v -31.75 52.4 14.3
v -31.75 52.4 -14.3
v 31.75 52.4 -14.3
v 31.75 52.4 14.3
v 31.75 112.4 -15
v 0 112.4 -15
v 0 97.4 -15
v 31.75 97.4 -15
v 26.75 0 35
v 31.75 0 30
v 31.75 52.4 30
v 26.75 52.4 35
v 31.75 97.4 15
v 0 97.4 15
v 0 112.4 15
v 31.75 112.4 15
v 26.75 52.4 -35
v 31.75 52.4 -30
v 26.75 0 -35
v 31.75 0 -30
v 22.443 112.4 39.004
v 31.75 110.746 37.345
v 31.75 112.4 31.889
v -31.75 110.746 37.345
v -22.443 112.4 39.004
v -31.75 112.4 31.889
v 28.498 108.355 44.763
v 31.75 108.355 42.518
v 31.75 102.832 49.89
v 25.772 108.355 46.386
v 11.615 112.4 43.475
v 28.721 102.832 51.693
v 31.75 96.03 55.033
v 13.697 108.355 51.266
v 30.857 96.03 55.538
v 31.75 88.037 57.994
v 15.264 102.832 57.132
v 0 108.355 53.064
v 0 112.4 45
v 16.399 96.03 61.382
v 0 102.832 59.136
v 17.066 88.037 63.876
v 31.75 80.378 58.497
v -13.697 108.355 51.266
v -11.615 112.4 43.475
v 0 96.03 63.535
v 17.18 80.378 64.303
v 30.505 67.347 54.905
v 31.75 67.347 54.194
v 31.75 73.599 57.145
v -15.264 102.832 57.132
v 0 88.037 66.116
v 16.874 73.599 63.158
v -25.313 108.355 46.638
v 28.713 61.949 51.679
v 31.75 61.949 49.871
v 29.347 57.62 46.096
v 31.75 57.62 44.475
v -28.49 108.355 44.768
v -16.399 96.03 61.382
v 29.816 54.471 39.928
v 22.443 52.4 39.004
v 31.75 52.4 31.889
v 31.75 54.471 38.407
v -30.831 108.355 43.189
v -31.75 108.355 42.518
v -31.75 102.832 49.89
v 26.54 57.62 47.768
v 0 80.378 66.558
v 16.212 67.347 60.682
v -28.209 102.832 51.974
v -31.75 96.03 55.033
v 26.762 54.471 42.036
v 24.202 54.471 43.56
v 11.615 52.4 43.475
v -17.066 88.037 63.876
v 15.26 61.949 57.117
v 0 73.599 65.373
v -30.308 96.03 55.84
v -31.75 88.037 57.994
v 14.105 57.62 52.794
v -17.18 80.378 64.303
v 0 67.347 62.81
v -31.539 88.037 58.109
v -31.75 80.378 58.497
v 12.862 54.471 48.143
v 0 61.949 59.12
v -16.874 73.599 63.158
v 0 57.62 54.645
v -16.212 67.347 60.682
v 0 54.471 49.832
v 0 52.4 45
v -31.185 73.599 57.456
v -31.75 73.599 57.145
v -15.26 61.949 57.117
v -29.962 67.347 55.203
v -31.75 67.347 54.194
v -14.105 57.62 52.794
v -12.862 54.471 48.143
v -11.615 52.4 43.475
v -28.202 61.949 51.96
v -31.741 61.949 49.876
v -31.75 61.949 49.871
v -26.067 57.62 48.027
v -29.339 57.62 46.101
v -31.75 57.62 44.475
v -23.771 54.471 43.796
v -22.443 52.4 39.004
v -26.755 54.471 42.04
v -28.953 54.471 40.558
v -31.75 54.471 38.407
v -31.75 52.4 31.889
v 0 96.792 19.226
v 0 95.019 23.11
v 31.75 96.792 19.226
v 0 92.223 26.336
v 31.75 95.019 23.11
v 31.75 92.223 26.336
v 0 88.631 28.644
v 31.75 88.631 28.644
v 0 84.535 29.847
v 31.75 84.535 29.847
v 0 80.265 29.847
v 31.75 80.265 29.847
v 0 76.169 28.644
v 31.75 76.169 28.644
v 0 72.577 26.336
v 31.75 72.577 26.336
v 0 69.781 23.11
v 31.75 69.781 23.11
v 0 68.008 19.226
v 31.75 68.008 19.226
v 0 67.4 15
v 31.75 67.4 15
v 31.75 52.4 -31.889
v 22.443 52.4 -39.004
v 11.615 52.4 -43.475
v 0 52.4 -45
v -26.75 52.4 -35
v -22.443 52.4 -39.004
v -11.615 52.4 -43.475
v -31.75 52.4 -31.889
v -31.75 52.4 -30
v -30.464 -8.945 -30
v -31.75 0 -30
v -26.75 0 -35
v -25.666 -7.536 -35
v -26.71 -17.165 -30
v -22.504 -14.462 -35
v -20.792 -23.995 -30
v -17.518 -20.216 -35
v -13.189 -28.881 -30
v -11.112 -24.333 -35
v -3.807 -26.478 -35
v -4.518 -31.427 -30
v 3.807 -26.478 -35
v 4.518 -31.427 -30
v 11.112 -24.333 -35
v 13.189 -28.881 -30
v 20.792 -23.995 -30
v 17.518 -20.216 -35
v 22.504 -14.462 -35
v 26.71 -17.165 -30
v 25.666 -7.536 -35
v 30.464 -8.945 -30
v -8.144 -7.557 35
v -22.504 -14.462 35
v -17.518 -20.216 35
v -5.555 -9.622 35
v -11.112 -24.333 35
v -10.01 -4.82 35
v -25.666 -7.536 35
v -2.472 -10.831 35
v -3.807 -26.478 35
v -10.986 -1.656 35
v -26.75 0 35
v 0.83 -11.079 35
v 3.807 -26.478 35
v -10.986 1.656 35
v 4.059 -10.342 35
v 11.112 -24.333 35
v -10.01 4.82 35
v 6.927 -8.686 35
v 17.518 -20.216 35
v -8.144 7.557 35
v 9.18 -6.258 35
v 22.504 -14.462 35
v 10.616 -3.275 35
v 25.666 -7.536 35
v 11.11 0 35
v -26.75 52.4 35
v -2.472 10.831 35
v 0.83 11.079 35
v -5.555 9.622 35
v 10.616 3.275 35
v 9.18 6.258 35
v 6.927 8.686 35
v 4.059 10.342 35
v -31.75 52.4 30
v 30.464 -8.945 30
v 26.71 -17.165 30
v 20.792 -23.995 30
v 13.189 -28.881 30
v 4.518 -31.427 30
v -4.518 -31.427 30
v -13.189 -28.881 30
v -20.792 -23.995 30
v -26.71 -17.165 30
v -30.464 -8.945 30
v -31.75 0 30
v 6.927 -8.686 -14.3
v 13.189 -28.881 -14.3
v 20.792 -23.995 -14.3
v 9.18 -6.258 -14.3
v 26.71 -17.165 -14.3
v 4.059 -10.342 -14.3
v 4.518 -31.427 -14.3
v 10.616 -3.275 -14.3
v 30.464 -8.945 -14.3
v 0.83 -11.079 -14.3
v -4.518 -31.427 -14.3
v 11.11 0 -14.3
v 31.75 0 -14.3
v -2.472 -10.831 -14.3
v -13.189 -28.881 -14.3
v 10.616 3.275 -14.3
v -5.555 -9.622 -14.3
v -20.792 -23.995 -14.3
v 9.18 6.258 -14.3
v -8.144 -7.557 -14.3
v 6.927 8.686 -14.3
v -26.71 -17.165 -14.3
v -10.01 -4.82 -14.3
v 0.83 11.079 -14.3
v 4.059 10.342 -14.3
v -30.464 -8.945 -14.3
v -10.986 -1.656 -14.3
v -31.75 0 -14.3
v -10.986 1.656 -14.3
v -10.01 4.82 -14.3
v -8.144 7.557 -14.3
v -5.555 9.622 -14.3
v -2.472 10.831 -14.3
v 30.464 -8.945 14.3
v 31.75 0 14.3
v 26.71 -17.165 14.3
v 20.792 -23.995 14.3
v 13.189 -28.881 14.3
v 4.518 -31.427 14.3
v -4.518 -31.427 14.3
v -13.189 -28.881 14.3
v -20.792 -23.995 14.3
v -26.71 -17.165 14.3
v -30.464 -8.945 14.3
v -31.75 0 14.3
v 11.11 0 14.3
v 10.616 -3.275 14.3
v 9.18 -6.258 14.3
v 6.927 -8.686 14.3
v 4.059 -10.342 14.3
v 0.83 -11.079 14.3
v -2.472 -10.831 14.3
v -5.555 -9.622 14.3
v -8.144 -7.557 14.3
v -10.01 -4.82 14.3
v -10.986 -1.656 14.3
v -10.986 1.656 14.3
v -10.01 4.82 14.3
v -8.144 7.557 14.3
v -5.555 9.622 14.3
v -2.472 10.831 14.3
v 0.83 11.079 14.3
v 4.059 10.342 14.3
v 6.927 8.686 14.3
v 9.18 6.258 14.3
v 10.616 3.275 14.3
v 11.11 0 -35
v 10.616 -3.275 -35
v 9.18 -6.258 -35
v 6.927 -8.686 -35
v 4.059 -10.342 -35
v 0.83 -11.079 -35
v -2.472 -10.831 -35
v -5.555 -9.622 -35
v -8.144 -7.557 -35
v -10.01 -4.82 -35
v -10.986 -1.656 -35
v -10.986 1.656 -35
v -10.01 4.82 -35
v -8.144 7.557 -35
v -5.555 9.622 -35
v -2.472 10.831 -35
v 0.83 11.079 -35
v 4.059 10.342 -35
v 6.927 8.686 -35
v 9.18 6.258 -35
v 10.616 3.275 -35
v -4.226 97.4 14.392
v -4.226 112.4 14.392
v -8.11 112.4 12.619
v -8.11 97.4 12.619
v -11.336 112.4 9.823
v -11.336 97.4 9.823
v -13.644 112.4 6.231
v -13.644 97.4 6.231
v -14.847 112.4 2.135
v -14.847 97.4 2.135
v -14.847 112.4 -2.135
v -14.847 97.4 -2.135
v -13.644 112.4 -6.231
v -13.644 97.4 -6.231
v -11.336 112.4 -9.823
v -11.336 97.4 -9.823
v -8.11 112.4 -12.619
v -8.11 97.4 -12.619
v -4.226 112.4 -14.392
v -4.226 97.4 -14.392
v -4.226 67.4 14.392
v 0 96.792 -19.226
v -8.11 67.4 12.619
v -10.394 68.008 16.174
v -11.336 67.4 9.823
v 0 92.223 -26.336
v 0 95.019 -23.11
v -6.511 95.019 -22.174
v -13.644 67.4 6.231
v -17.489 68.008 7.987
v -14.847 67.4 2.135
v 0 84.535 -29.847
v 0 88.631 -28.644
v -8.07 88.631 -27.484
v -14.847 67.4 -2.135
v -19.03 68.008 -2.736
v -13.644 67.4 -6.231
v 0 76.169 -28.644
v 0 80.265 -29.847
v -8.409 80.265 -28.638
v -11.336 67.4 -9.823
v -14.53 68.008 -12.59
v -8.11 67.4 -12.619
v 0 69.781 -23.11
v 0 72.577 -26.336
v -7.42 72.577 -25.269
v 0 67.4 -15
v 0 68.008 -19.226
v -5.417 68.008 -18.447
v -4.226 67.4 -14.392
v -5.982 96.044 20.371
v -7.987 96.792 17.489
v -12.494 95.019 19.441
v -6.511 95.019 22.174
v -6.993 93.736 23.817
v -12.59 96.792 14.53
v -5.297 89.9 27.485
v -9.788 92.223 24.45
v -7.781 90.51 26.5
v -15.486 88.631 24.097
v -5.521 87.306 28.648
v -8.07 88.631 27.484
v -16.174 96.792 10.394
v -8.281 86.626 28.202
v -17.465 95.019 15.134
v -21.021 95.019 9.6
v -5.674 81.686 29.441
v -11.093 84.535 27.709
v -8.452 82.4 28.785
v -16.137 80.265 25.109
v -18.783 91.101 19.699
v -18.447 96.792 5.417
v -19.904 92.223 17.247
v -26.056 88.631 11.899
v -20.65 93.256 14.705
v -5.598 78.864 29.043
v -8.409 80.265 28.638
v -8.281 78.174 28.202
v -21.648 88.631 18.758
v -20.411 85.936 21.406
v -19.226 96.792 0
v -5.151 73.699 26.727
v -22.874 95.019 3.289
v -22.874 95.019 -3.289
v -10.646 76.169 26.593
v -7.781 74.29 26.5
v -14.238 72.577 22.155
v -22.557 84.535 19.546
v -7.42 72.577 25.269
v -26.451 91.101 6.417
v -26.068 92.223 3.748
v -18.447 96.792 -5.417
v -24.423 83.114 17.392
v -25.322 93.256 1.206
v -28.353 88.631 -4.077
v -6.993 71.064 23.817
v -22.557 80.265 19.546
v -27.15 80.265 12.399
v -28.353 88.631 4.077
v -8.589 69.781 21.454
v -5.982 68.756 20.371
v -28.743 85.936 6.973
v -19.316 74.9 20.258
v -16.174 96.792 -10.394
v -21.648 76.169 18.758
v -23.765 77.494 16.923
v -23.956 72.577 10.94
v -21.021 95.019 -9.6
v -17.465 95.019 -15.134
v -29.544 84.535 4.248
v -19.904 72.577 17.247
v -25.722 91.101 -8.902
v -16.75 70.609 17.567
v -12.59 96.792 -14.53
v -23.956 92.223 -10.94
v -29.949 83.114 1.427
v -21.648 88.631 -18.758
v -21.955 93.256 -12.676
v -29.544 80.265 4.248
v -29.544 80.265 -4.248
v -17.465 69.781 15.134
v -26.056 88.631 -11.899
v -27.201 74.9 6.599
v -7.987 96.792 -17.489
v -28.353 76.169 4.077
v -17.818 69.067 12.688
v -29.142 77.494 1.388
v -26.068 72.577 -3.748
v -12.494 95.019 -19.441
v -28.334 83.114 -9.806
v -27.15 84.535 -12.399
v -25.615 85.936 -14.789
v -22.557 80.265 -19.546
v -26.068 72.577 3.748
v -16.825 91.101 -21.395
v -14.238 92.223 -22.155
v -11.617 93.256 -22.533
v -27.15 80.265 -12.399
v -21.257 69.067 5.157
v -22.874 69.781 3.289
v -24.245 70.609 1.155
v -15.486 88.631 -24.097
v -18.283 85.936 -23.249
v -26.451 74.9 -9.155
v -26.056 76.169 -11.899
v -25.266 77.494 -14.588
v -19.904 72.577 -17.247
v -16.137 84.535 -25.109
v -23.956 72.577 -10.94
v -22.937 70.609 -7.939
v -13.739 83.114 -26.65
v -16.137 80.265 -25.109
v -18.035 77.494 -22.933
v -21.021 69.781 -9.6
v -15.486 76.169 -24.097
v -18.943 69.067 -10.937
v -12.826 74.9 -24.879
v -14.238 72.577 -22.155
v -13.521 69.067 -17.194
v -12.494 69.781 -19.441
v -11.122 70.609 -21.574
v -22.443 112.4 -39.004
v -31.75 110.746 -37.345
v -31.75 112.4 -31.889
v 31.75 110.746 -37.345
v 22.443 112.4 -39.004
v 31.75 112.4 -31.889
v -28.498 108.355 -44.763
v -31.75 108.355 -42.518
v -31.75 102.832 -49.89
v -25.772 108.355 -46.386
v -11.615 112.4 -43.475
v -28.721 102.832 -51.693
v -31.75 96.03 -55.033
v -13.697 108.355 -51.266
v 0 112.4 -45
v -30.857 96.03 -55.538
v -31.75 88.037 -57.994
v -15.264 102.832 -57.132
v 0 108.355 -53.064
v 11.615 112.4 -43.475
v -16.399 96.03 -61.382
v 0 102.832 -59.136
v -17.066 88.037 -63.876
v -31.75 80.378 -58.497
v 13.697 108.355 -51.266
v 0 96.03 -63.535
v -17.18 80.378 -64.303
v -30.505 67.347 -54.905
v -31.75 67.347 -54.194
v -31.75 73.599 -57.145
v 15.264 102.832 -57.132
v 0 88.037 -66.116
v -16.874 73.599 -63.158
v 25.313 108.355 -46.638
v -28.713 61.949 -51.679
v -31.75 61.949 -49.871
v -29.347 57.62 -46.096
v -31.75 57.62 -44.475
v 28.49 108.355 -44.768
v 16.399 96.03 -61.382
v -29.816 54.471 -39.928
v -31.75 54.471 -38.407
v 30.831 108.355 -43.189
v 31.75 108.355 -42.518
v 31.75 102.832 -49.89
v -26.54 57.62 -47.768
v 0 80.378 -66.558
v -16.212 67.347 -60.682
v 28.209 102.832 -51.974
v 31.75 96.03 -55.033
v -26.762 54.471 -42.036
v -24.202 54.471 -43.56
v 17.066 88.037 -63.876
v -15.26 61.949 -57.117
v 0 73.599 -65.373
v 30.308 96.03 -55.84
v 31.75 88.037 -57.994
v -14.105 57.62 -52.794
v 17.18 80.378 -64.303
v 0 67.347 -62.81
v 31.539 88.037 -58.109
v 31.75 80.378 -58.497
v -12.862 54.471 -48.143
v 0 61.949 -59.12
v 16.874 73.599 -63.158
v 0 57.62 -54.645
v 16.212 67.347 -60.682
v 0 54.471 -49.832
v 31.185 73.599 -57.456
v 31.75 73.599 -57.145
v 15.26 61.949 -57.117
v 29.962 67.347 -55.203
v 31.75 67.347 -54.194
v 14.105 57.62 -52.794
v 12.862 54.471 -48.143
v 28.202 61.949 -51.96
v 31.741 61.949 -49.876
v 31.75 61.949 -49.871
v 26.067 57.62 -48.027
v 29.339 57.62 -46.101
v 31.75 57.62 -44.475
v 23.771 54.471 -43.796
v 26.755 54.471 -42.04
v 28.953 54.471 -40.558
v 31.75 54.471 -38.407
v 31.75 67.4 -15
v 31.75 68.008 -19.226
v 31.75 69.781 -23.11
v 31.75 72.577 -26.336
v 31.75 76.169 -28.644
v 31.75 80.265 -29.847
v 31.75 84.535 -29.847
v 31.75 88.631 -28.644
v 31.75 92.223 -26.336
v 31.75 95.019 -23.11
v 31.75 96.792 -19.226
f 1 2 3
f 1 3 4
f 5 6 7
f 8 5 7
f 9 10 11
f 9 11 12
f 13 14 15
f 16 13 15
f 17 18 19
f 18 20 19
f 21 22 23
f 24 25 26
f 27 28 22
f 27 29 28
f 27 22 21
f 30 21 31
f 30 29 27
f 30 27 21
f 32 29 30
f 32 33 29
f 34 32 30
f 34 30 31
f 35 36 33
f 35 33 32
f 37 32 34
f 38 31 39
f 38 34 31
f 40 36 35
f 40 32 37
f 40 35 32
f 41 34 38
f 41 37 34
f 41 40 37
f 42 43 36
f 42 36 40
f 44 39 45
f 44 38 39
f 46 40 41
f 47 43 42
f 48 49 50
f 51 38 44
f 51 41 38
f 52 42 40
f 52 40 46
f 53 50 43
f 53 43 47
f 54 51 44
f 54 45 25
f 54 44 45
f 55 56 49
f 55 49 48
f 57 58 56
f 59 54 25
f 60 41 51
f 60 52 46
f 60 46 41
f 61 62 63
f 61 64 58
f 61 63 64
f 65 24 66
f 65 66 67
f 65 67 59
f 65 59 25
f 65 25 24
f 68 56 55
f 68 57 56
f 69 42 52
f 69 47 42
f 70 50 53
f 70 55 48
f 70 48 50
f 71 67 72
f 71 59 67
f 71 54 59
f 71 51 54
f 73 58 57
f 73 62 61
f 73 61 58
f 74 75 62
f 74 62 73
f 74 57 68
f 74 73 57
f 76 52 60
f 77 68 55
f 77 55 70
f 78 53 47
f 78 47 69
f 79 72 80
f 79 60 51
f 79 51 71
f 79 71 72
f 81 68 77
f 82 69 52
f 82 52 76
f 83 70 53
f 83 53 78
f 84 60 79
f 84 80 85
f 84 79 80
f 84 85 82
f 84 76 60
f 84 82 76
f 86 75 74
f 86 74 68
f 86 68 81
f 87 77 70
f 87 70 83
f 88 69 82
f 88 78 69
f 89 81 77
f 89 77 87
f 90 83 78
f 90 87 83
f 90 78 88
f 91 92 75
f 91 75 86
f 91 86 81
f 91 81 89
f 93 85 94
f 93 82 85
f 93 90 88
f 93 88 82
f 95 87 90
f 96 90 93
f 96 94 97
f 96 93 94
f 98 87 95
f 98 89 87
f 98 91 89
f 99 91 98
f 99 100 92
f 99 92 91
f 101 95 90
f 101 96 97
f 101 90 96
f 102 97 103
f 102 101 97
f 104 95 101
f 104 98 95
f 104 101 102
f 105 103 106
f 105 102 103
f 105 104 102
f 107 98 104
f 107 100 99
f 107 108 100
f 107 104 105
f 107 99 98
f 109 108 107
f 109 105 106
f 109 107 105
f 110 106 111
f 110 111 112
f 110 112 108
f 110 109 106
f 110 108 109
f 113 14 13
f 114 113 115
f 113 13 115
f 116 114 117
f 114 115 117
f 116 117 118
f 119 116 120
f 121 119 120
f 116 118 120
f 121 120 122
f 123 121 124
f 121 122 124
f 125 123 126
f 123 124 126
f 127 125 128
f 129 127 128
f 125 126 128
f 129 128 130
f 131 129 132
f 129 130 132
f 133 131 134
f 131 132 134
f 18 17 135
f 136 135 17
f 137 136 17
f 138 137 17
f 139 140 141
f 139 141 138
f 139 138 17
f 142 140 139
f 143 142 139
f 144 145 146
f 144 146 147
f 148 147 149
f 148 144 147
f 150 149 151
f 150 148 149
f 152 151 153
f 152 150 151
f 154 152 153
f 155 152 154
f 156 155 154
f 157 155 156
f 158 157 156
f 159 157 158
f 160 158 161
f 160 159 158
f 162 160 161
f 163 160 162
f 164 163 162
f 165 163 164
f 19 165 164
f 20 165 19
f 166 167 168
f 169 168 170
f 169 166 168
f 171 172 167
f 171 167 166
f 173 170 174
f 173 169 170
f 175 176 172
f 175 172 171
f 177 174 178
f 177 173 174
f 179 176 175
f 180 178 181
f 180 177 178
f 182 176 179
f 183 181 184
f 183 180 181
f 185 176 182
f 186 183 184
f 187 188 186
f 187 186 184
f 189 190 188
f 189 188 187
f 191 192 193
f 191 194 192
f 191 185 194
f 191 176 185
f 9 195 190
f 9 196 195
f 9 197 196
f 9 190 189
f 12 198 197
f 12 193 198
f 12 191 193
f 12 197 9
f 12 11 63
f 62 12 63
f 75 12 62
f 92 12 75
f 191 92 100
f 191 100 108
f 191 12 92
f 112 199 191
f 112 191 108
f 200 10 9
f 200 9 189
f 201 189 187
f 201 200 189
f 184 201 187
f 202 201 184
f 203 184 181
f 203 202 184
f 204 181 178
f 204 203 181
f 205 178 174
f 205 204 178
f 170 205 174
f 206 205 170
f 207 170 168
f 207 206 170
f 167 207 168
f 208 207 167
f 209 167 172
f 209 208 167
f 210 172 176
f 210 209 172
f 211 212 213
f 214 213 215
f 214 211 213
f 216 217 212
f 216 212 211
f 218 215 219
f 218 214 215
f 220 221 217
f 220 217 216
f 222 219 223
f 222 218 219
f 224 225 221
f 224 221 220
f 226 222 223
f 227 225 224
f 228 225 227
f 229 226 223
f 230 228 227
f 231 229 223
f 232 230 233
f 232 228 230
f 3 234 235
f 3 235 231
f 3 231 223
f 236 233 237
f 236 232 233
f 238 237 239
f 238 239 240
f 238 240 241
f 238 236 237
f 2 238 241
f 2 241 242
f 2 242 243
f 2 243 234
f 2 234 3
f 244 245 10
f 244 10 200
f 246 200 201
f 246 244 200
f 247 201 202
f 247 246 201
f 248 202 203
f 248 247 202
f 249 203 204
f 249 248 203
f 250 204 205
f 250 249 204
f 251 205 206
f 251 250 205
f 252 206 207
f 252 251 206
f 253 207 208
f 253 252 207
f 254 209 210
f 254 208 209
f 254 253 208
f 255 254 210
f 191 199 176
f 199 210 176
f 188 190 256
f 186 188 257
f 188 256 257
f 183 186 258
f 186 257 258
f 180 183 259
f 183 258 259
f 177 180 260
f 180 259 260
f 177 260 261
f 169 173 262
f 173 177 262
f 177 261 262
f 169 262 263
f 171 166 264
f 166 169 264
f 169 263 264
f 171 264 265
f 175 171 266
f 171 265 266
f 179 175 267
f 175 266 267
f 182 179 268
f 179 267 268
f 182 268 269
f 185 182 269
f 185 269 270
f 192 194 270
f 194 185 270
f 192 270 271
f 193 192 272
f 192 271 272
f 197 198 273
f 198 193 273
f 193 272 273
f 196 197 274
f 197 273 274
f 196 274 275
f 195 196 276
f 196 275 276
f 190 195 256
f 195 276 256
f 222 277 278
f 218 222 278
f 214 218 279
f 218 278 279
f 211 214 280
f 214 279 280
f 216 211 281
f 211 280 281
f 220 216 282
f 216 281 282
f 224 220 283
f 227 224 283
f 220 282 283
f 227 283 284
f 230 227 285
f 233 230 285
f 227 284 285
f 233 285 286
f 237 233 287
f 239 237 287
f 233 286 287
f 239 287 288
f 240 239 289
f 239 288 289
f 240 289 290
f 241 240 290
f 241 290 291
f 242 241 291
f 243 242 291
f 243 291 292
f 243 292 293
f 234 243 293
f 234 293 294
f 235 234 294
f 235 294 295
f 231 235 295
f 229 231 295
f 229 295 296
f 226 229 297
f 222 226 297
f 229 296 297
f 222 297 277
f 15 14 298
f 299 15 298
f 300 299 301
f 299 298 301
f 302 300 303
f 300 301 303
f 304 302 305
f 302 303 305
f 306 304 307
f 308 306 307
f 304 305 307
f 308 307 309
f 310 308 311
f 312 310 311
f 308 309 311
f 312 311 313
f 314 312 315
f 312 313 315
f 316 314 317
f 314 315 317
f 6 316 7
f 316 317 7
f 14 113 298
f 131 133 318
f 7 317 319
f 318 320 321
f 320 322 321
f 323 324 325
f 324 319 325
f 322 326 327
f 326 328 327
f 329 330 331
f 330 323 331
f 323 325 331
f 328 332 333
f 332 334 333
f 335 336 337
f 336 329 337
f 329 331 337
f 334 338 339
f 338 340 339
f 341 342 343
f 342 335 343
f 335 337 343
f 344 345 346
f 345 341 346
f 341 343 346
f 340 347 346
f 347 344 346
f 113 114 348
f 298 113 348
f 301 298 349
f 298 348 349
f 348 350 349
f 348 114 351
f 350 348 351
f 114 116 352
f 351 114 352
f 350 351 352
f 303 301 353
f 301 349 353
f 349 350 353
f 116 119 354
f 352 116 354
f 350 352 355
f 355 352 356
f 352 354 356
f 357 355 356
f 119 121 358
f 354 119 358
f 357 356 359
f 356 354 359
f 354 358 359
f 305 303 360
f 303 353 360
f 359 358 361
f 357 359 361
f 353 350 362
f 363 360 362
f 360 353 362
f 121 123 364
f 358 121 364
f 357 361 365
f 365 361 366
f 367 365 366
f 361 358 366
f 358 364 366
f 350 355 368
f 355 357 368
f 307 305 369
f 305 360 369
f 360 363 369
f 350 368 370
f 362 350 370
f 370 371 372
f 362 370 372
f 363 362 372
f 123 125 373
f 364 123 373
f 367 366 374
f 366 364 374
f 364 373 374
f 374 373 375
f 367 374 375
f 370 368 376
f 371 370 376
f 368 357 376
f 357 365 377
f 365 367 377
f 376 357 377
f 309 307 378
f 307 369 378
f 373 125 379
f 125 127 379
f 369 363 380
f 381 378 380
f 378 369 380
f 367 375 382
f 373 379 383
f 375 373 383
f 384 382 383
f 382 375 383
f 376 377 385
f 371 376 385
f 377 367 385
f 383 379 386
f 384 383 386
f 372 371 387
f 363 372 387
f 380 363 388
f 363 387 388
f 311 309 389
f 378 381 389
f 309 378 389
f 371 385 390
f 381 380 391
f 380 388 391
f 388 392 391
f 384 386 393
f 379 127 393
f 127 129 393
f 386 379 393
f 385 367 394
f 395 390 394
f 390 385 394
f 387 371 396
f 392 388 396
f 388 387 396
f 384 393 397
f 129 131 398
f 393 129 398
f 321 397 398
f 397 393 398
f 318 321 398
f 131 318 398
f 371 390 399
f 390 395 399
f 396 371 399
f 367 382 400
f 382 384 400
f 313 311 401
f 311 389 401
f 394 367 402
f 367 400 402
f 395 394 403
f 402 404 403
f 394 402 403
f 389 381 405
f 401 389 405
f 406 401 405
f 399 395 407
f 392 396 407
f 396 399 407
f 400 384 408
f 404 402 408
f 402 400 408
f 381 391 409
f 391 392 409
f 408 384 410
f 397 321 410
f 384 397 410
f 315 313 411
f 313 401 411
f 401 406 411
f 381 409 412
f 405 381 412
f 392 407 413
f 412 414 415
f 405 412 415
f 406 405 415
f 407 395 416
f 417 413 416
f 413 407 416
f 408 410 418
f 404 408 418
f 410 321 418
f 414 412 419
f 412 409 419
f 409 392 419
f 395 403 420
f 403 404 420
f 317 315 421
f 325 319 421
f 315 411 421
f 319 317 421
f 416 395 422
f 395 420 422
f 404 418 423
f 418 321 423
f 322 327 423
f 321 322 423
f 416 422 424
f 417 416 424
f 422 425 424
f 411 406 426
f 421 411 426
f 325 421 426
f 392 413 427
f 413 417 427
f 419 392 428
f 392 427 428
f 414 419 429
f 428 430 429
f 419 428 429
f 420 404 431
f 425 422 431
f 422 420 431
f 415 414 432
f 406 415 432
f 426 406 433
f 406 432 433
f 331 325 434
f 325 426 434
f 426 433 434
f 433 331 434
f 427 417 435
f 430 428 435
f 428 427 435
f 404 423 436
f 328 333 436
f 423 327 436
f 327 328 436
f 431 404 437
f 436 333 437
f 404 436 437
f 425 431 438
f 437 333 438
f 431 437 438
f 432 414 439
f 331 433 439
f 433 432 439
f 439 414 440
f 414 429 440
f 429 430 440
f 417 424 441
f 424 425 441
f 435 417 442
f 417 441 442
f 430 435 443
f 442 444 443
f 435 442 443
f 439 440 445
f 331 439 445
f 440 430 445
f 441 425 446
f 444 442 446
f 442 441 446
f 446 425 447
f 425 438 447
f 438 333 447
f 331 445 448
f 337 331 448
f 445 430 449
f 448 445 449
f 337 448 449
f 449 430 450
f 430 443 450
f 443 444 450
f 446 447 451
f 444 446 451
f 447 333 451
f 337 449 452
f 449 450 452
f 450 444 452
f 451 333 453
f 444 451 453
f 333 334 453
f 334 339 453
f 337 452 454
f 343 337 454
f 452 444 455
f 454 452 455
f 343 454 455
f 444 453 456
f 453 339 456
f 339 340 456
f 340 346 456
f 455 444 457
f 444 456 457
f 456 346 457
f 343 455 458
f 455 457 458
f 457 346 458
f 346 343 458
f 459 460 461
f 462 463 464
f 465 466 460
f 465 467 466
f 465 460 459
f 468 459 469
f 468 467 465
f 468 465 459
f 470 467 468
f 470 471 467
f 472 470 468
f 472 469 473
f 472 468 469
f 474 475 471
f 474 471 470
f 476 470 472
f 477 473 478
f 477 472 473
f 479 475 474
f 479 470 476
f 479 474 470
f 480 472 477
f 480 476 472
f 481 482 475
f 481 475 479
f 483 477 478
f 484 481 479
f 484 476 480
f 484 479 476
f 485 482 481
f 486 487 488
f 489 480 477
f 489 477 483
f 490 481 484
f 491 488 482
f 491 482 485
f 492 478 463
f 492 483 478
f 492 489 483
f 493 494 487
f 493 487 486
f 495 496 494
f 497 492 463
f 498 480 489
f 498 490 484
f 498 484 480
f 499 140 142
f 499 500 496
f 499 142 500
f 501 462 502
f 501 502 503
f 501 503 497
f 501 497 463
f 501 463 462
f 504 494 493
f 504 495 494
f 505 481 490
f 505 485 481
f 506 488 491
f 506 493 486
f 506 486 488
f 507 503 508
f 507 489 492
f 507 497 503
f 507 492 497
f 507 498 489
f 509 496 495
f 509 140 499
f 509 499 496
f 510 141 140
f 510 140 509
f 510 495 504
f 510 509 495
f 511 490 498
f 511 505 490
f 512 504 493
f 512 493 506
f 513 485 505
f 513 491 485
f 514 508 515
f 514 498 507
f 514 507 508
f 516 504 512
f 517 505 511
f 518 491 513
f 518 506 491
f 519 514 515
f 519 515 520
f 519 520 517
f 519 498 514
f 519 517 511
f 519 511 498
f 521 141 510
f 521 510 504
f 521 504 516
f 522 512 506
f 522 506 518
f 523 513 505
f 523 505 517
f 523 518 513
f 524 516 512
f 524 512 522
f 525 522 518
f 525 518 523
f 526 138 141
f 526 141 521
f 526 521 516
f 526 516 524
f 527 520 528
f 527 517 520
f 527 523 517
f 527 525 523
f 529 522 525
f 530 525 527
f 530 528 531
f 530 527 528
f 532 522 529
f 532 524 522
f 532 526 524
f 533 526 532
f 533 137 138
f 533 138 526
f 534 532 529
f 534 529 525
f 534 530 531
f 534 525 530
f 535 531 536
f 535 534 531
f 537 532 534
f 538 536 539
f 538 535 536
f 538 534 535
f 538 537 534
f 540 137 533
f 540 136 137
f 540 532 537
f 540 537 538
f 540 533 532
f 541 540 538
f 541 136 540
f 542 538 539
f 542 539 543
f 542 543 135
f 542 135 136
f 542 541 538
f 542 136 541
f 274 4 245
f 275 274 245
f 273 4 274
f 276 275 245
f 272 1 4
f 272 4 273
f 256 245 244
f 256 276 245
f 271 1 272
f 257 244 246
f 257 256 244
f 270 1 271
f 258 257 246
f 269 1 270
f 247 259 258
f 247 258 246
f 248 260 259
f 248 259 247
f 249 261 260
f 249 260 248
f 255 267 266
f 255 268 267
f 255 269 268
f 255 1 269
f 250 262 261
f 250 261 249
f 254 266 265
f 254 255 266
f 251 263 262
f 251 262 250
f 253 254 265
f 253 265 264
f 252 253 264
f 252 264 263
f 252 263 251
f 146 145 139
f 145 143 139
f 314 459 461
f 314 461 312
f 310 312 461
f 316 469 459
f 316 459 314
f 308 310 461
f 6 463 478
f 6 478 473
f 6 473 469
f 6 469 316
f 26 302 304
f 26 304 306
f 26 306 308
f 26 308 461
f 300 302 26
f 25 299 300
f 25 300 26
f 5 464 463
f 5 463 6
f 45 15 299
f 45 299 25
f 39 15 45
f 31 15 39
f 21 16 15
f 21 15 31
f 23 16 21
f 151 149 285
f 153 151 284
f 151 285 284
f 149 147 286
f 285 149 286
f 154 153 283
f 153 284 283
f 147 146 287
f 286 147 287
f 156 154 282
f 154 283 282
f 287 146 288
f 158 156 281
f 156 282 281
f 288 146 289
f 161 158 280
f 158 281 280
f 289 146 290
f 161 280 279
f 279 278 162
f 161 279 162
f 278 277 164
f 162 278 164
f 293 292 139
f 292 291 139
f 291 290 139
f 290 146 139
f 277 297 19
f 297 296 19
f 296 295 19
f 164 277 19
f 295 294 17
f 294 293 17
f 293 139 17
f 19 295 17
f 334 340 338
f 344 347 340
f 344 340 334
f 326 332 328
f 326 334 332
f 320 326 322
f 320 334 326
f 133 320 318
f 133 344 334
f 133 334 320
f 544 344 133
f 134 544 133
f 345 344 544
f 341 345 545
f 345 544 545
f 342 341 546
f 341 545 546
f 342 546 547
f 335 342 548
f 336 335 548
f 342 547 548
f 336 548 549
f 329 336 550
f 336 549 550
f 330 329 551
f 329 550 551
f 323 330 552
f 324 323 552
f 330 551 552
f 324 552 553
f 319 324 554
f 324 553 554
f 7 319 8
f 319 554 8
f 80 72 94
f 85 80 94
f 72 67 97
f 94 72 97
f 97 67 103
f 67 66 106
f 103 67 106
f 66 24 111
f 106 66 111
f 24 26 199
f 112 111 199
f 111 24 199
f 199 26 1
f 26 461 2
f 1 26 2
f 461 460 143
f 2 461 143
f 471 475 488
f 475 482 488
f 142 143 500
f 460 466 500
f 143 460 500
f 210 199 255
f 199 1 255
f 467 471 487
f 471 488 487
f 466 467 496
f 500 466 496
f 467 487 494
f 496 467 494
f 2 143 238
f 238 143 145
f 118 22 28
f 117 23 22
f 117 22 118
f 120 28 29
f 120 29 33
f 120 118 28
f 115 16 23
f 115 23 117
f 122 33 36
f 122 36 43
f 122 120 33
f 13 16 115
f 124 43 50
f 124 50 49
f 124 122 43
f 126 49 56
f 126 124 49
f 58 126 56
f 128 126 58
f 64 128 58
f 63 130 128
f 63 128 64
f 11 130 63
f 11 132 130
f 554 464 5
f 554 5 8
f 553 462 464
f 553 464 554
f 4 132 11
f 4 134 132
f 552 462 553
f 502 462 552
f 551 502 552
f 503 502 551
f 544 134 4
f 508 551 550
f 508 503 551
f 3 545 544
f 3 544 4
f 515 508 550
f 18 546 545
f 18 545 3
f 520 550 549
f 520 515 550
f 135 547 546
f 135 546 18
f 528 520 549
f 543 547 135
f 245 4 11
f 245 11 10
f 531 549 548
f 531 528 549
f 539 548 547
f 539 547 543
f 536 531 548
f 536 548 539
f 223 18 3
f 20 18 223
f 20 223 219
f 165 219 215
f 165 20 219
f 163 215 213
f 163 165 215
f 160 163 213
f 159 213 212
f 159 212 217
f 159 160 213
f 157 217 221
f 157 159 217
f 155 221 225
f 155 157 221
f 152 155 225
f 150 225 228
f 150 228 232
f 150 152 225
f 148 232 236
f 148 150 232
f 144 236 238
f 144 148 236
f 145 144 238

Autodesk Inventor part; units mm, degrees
ref_plane "YZ Plane" through (0, 0, 0) normal (1, 0, 0) x (0, 1, 0)
ref_plane "XZ Plane" through (0, 0, 0) normal (0, 1, 0) x (-1, 0, 0)
ref_plane "XY Plane" through (0, 0, 0) normal (0, 0, 1) x (1, 0, 0)
sketch "Sketch1" plane through (0, 0, 0) normal (0, 0, 1) x (1, 0, 0)
  circle A0 centre (0, 0) radius 11.11
  arc A1 (-31.75, 0) -> (31.75, 0) centre (0, 0) ccw
  line L0 (31.75, 0) -> (31.75, 52.4)
  line L1 (-31.75, 0) -> (-31.75, 52.4)
  line L2 (-31.75, 74.62) -> (31.75, 74.62) construction
  line L3 (-31.75, 112.4) -> (31.75, 112.4)
  line L4 (31.75, 52.4) -> (31.75, 112.4)
  line L5 (-31.75, 112.4) -> (-31.75, 52.4)
  point P0 (0, 74.62)
  dimension "d0" = 22.22
  dimension "d3" = 31.75
  dimension "d4" = 52.4
  dimension "d7" = 74.62
  dimension "d17" = 60
extrude "Extrusion1" add sketch "Sketch1" along normal mid plane 70
sketch "Sketch2" plane through (0, 0, 0) normal (1, 0, 0) x (0, 1, 0)
  line L0 (52.4, 14.3) -> (-52.4, 14.3)
  line L1 (-52.4, 14.3) -> (-52.4, -14.3)
  line L2 (-52.4, -14.3) -> (52.4, -14.3)
  line L3 (52.4, -14.3) -> (52.4, 14.3)
  line L4 (52.4, 14.3) -> (-52.4, -14.3) construction
  line L5 (-52.4, 14.3) -> (52.4, -14.3) construction
  point P0 (0, 0)
  dimension "d13" = 28.6
  dimension "d14" = 52.4
extrude "Extrusion2" cut sketch "Sketch2" along normal through all both and the other way through all
sketch "Sketch3" plane through (0, 0, 0) normal (1, 0, 0) x (0, 1, 0)
  line L0 (52.4, 14.3) -> (52.4, -14.3) projected
  line L1 (112.4, -35) -> (112.4, 35) projected
  line L2 (52.4, 14.3) -> (52.4, 35)
  line L3 (52.4, -14.3) -> (52.4, -35)
  line L4 (52.4, 0) -> (112.4, 0)
  line L5 (112.4, -35) -> (112.4, -45)
  line L6 (52.4, -35) -> (52.4, -45)
  line L7 (52.4, 35) -> (52.4, 45)
  line L8 (112.4, 35) -> (112.4, 45)
  arc A0 (52.4, -45) -> (112.4, -45) centre (82.4, -35) ccw
  line L9 (112.4, -35) -> (0, -35) projected
  arc A1 (112.4, 45) -> (52.4, 45) centre (82.4, 35) ccw
  point P0 (0, 0)
  dimension "d22" = 10
sketch "Sketch4" plane through (-31.75, 112.4, 35) normal (0, 1, 0) x (1, 0, 0)
  line L0 (0, 70) -> (0, 0) projected
  line L1 (63.5, 0) -> (0, 0) projected
  line L2 (63.5, 70) -> (63.5, 0) projected
  line L3 (0, 70) -> (63.5, 70) projected
  line L4 (15, 15) -> (15, 55)
  line L5 (15, 55) -> (48.5, 55)
  line L6 (48.5, 55) -> (48.5, 15)
  line L7 (48.5, 15) -> (15, 15)
  point P0 (31.75, 35)
  dimension "d19" = 15
extrude "Extrusion3" cut sketch "Sketch4" against normal up to surface (60 mm away)
revolve "Revolution1" add sketch "Sketch3" angle 360 about axis through (0, 52.4, 0) along (0, 1, 0) contours L2 L7 A1 L8 L1 L4 L0
chamfer "Chamfer1" distance 5 angle 45 6 edges at (31.75, 26.2, 35) (0, -31.75, 35) (-31.75, 26.2, 35) (31.75, 26.2, -35) (0, -31.75, -35) (-31.75, 26.2, -35)
sketch "Sketch5" plane through (0, 0, 0) normal (0, 0, 1) x (1, 0, 0)
  line L0 (31.75, 52.4) -> (31.75, 0) projected
  line L1 (31.75, 52.4) -> (91.75, 52.4)
  line L2 (91.75, 52.4) -> (91.75, 112.4)
  line L3 (91.75, 112.4) -> (31.75, 112.4)
  line L4 (31.75, 112.4) -> (31.75, 52.4)
  line L5 (45, 112.4) -> (-45, 112.4) construction
  line L6 (0, 52.4) -> (0, 112.4)
  line L7 (-31.75, 52.4) -> (-31.75, 0)
  line L8 (-31.75, 52.4) -> (-91.75, 52.4)
  line L9 (-91.75, 52.4) -> (-91.75, 112.4)
  line L10 (-91.75, 112.4) -> (-31.75, 112.4)
  line L11 (-31.75, 112.4) -> (-31.75, 52.4)
  line L12 (-45, 112.4) -> (45, 112.4) construction
  point P0 (0, 0)
  dimension "d28" = 60
extrude "Extrusion4" cut sketch "Sketch5" along normal through all both and the other way through all
sketch "Sketch6" plane through (0, 0, 0) normal (1, 0, 0) x (0, 1, 0)
  line L0 (112.4, 31.8895) -> (112.4, -31.8895) projected
  line L1 (112.4, 0) -> (112.4, 15)
  line L2 (112.4, 15) -> (97.4, 15)
  arc A0 (97.4, 15) -> (67.4, 15) centre (82.4, 15) ccw
  line L3 (112.4, 0) -> (67.4, 0)
  line L4 (67.4, 0) -> (67.4, 15)
  point P0 (0, 0)
  dimension "d31" = 15
  dimension "d32" = 15
  dimension "d34" = 15
revolve "Revolution2" cut sketch "Sketch6" angle 360 about axis through (0, 112.4, 0) along (0, -1, 0)
sketch "Sketch7" plane through (31.75, 0, 14.3) normal (1, 0, 0) x (0, 0, -1)
  line L0 (29.3, 67.4) -> (-0.7, 67.4) projected
  line L1 (29.3, 97.4) -> (-0.7, 97.4) construction
  arc A0 (-0.7, 97.4) -> (-0.7, 67.4) centre (-0.7, 82.4) ccw
  arc A1 (29.3, 67.4) -> (29.3, 97.4) centre (29.3, 82.4) ccw
  line L2 (46.1895, 112.4) -> (-17.5895, 112.4) construction
  line L3 (29.3, 112.4) -> (29.3, 97.4)
  line L4 (29.3, 112.4) -> (-0.7, 112.4)
  line L5 (-0.7, 97.4) -> (-0.7, 112.4)
  point P0 (14.3, 0)
extrude "Extrusion5" cut sketch "Sketch7" against normal up to surface (31.75 mm away)
properties part number "Clevis-Socket"
